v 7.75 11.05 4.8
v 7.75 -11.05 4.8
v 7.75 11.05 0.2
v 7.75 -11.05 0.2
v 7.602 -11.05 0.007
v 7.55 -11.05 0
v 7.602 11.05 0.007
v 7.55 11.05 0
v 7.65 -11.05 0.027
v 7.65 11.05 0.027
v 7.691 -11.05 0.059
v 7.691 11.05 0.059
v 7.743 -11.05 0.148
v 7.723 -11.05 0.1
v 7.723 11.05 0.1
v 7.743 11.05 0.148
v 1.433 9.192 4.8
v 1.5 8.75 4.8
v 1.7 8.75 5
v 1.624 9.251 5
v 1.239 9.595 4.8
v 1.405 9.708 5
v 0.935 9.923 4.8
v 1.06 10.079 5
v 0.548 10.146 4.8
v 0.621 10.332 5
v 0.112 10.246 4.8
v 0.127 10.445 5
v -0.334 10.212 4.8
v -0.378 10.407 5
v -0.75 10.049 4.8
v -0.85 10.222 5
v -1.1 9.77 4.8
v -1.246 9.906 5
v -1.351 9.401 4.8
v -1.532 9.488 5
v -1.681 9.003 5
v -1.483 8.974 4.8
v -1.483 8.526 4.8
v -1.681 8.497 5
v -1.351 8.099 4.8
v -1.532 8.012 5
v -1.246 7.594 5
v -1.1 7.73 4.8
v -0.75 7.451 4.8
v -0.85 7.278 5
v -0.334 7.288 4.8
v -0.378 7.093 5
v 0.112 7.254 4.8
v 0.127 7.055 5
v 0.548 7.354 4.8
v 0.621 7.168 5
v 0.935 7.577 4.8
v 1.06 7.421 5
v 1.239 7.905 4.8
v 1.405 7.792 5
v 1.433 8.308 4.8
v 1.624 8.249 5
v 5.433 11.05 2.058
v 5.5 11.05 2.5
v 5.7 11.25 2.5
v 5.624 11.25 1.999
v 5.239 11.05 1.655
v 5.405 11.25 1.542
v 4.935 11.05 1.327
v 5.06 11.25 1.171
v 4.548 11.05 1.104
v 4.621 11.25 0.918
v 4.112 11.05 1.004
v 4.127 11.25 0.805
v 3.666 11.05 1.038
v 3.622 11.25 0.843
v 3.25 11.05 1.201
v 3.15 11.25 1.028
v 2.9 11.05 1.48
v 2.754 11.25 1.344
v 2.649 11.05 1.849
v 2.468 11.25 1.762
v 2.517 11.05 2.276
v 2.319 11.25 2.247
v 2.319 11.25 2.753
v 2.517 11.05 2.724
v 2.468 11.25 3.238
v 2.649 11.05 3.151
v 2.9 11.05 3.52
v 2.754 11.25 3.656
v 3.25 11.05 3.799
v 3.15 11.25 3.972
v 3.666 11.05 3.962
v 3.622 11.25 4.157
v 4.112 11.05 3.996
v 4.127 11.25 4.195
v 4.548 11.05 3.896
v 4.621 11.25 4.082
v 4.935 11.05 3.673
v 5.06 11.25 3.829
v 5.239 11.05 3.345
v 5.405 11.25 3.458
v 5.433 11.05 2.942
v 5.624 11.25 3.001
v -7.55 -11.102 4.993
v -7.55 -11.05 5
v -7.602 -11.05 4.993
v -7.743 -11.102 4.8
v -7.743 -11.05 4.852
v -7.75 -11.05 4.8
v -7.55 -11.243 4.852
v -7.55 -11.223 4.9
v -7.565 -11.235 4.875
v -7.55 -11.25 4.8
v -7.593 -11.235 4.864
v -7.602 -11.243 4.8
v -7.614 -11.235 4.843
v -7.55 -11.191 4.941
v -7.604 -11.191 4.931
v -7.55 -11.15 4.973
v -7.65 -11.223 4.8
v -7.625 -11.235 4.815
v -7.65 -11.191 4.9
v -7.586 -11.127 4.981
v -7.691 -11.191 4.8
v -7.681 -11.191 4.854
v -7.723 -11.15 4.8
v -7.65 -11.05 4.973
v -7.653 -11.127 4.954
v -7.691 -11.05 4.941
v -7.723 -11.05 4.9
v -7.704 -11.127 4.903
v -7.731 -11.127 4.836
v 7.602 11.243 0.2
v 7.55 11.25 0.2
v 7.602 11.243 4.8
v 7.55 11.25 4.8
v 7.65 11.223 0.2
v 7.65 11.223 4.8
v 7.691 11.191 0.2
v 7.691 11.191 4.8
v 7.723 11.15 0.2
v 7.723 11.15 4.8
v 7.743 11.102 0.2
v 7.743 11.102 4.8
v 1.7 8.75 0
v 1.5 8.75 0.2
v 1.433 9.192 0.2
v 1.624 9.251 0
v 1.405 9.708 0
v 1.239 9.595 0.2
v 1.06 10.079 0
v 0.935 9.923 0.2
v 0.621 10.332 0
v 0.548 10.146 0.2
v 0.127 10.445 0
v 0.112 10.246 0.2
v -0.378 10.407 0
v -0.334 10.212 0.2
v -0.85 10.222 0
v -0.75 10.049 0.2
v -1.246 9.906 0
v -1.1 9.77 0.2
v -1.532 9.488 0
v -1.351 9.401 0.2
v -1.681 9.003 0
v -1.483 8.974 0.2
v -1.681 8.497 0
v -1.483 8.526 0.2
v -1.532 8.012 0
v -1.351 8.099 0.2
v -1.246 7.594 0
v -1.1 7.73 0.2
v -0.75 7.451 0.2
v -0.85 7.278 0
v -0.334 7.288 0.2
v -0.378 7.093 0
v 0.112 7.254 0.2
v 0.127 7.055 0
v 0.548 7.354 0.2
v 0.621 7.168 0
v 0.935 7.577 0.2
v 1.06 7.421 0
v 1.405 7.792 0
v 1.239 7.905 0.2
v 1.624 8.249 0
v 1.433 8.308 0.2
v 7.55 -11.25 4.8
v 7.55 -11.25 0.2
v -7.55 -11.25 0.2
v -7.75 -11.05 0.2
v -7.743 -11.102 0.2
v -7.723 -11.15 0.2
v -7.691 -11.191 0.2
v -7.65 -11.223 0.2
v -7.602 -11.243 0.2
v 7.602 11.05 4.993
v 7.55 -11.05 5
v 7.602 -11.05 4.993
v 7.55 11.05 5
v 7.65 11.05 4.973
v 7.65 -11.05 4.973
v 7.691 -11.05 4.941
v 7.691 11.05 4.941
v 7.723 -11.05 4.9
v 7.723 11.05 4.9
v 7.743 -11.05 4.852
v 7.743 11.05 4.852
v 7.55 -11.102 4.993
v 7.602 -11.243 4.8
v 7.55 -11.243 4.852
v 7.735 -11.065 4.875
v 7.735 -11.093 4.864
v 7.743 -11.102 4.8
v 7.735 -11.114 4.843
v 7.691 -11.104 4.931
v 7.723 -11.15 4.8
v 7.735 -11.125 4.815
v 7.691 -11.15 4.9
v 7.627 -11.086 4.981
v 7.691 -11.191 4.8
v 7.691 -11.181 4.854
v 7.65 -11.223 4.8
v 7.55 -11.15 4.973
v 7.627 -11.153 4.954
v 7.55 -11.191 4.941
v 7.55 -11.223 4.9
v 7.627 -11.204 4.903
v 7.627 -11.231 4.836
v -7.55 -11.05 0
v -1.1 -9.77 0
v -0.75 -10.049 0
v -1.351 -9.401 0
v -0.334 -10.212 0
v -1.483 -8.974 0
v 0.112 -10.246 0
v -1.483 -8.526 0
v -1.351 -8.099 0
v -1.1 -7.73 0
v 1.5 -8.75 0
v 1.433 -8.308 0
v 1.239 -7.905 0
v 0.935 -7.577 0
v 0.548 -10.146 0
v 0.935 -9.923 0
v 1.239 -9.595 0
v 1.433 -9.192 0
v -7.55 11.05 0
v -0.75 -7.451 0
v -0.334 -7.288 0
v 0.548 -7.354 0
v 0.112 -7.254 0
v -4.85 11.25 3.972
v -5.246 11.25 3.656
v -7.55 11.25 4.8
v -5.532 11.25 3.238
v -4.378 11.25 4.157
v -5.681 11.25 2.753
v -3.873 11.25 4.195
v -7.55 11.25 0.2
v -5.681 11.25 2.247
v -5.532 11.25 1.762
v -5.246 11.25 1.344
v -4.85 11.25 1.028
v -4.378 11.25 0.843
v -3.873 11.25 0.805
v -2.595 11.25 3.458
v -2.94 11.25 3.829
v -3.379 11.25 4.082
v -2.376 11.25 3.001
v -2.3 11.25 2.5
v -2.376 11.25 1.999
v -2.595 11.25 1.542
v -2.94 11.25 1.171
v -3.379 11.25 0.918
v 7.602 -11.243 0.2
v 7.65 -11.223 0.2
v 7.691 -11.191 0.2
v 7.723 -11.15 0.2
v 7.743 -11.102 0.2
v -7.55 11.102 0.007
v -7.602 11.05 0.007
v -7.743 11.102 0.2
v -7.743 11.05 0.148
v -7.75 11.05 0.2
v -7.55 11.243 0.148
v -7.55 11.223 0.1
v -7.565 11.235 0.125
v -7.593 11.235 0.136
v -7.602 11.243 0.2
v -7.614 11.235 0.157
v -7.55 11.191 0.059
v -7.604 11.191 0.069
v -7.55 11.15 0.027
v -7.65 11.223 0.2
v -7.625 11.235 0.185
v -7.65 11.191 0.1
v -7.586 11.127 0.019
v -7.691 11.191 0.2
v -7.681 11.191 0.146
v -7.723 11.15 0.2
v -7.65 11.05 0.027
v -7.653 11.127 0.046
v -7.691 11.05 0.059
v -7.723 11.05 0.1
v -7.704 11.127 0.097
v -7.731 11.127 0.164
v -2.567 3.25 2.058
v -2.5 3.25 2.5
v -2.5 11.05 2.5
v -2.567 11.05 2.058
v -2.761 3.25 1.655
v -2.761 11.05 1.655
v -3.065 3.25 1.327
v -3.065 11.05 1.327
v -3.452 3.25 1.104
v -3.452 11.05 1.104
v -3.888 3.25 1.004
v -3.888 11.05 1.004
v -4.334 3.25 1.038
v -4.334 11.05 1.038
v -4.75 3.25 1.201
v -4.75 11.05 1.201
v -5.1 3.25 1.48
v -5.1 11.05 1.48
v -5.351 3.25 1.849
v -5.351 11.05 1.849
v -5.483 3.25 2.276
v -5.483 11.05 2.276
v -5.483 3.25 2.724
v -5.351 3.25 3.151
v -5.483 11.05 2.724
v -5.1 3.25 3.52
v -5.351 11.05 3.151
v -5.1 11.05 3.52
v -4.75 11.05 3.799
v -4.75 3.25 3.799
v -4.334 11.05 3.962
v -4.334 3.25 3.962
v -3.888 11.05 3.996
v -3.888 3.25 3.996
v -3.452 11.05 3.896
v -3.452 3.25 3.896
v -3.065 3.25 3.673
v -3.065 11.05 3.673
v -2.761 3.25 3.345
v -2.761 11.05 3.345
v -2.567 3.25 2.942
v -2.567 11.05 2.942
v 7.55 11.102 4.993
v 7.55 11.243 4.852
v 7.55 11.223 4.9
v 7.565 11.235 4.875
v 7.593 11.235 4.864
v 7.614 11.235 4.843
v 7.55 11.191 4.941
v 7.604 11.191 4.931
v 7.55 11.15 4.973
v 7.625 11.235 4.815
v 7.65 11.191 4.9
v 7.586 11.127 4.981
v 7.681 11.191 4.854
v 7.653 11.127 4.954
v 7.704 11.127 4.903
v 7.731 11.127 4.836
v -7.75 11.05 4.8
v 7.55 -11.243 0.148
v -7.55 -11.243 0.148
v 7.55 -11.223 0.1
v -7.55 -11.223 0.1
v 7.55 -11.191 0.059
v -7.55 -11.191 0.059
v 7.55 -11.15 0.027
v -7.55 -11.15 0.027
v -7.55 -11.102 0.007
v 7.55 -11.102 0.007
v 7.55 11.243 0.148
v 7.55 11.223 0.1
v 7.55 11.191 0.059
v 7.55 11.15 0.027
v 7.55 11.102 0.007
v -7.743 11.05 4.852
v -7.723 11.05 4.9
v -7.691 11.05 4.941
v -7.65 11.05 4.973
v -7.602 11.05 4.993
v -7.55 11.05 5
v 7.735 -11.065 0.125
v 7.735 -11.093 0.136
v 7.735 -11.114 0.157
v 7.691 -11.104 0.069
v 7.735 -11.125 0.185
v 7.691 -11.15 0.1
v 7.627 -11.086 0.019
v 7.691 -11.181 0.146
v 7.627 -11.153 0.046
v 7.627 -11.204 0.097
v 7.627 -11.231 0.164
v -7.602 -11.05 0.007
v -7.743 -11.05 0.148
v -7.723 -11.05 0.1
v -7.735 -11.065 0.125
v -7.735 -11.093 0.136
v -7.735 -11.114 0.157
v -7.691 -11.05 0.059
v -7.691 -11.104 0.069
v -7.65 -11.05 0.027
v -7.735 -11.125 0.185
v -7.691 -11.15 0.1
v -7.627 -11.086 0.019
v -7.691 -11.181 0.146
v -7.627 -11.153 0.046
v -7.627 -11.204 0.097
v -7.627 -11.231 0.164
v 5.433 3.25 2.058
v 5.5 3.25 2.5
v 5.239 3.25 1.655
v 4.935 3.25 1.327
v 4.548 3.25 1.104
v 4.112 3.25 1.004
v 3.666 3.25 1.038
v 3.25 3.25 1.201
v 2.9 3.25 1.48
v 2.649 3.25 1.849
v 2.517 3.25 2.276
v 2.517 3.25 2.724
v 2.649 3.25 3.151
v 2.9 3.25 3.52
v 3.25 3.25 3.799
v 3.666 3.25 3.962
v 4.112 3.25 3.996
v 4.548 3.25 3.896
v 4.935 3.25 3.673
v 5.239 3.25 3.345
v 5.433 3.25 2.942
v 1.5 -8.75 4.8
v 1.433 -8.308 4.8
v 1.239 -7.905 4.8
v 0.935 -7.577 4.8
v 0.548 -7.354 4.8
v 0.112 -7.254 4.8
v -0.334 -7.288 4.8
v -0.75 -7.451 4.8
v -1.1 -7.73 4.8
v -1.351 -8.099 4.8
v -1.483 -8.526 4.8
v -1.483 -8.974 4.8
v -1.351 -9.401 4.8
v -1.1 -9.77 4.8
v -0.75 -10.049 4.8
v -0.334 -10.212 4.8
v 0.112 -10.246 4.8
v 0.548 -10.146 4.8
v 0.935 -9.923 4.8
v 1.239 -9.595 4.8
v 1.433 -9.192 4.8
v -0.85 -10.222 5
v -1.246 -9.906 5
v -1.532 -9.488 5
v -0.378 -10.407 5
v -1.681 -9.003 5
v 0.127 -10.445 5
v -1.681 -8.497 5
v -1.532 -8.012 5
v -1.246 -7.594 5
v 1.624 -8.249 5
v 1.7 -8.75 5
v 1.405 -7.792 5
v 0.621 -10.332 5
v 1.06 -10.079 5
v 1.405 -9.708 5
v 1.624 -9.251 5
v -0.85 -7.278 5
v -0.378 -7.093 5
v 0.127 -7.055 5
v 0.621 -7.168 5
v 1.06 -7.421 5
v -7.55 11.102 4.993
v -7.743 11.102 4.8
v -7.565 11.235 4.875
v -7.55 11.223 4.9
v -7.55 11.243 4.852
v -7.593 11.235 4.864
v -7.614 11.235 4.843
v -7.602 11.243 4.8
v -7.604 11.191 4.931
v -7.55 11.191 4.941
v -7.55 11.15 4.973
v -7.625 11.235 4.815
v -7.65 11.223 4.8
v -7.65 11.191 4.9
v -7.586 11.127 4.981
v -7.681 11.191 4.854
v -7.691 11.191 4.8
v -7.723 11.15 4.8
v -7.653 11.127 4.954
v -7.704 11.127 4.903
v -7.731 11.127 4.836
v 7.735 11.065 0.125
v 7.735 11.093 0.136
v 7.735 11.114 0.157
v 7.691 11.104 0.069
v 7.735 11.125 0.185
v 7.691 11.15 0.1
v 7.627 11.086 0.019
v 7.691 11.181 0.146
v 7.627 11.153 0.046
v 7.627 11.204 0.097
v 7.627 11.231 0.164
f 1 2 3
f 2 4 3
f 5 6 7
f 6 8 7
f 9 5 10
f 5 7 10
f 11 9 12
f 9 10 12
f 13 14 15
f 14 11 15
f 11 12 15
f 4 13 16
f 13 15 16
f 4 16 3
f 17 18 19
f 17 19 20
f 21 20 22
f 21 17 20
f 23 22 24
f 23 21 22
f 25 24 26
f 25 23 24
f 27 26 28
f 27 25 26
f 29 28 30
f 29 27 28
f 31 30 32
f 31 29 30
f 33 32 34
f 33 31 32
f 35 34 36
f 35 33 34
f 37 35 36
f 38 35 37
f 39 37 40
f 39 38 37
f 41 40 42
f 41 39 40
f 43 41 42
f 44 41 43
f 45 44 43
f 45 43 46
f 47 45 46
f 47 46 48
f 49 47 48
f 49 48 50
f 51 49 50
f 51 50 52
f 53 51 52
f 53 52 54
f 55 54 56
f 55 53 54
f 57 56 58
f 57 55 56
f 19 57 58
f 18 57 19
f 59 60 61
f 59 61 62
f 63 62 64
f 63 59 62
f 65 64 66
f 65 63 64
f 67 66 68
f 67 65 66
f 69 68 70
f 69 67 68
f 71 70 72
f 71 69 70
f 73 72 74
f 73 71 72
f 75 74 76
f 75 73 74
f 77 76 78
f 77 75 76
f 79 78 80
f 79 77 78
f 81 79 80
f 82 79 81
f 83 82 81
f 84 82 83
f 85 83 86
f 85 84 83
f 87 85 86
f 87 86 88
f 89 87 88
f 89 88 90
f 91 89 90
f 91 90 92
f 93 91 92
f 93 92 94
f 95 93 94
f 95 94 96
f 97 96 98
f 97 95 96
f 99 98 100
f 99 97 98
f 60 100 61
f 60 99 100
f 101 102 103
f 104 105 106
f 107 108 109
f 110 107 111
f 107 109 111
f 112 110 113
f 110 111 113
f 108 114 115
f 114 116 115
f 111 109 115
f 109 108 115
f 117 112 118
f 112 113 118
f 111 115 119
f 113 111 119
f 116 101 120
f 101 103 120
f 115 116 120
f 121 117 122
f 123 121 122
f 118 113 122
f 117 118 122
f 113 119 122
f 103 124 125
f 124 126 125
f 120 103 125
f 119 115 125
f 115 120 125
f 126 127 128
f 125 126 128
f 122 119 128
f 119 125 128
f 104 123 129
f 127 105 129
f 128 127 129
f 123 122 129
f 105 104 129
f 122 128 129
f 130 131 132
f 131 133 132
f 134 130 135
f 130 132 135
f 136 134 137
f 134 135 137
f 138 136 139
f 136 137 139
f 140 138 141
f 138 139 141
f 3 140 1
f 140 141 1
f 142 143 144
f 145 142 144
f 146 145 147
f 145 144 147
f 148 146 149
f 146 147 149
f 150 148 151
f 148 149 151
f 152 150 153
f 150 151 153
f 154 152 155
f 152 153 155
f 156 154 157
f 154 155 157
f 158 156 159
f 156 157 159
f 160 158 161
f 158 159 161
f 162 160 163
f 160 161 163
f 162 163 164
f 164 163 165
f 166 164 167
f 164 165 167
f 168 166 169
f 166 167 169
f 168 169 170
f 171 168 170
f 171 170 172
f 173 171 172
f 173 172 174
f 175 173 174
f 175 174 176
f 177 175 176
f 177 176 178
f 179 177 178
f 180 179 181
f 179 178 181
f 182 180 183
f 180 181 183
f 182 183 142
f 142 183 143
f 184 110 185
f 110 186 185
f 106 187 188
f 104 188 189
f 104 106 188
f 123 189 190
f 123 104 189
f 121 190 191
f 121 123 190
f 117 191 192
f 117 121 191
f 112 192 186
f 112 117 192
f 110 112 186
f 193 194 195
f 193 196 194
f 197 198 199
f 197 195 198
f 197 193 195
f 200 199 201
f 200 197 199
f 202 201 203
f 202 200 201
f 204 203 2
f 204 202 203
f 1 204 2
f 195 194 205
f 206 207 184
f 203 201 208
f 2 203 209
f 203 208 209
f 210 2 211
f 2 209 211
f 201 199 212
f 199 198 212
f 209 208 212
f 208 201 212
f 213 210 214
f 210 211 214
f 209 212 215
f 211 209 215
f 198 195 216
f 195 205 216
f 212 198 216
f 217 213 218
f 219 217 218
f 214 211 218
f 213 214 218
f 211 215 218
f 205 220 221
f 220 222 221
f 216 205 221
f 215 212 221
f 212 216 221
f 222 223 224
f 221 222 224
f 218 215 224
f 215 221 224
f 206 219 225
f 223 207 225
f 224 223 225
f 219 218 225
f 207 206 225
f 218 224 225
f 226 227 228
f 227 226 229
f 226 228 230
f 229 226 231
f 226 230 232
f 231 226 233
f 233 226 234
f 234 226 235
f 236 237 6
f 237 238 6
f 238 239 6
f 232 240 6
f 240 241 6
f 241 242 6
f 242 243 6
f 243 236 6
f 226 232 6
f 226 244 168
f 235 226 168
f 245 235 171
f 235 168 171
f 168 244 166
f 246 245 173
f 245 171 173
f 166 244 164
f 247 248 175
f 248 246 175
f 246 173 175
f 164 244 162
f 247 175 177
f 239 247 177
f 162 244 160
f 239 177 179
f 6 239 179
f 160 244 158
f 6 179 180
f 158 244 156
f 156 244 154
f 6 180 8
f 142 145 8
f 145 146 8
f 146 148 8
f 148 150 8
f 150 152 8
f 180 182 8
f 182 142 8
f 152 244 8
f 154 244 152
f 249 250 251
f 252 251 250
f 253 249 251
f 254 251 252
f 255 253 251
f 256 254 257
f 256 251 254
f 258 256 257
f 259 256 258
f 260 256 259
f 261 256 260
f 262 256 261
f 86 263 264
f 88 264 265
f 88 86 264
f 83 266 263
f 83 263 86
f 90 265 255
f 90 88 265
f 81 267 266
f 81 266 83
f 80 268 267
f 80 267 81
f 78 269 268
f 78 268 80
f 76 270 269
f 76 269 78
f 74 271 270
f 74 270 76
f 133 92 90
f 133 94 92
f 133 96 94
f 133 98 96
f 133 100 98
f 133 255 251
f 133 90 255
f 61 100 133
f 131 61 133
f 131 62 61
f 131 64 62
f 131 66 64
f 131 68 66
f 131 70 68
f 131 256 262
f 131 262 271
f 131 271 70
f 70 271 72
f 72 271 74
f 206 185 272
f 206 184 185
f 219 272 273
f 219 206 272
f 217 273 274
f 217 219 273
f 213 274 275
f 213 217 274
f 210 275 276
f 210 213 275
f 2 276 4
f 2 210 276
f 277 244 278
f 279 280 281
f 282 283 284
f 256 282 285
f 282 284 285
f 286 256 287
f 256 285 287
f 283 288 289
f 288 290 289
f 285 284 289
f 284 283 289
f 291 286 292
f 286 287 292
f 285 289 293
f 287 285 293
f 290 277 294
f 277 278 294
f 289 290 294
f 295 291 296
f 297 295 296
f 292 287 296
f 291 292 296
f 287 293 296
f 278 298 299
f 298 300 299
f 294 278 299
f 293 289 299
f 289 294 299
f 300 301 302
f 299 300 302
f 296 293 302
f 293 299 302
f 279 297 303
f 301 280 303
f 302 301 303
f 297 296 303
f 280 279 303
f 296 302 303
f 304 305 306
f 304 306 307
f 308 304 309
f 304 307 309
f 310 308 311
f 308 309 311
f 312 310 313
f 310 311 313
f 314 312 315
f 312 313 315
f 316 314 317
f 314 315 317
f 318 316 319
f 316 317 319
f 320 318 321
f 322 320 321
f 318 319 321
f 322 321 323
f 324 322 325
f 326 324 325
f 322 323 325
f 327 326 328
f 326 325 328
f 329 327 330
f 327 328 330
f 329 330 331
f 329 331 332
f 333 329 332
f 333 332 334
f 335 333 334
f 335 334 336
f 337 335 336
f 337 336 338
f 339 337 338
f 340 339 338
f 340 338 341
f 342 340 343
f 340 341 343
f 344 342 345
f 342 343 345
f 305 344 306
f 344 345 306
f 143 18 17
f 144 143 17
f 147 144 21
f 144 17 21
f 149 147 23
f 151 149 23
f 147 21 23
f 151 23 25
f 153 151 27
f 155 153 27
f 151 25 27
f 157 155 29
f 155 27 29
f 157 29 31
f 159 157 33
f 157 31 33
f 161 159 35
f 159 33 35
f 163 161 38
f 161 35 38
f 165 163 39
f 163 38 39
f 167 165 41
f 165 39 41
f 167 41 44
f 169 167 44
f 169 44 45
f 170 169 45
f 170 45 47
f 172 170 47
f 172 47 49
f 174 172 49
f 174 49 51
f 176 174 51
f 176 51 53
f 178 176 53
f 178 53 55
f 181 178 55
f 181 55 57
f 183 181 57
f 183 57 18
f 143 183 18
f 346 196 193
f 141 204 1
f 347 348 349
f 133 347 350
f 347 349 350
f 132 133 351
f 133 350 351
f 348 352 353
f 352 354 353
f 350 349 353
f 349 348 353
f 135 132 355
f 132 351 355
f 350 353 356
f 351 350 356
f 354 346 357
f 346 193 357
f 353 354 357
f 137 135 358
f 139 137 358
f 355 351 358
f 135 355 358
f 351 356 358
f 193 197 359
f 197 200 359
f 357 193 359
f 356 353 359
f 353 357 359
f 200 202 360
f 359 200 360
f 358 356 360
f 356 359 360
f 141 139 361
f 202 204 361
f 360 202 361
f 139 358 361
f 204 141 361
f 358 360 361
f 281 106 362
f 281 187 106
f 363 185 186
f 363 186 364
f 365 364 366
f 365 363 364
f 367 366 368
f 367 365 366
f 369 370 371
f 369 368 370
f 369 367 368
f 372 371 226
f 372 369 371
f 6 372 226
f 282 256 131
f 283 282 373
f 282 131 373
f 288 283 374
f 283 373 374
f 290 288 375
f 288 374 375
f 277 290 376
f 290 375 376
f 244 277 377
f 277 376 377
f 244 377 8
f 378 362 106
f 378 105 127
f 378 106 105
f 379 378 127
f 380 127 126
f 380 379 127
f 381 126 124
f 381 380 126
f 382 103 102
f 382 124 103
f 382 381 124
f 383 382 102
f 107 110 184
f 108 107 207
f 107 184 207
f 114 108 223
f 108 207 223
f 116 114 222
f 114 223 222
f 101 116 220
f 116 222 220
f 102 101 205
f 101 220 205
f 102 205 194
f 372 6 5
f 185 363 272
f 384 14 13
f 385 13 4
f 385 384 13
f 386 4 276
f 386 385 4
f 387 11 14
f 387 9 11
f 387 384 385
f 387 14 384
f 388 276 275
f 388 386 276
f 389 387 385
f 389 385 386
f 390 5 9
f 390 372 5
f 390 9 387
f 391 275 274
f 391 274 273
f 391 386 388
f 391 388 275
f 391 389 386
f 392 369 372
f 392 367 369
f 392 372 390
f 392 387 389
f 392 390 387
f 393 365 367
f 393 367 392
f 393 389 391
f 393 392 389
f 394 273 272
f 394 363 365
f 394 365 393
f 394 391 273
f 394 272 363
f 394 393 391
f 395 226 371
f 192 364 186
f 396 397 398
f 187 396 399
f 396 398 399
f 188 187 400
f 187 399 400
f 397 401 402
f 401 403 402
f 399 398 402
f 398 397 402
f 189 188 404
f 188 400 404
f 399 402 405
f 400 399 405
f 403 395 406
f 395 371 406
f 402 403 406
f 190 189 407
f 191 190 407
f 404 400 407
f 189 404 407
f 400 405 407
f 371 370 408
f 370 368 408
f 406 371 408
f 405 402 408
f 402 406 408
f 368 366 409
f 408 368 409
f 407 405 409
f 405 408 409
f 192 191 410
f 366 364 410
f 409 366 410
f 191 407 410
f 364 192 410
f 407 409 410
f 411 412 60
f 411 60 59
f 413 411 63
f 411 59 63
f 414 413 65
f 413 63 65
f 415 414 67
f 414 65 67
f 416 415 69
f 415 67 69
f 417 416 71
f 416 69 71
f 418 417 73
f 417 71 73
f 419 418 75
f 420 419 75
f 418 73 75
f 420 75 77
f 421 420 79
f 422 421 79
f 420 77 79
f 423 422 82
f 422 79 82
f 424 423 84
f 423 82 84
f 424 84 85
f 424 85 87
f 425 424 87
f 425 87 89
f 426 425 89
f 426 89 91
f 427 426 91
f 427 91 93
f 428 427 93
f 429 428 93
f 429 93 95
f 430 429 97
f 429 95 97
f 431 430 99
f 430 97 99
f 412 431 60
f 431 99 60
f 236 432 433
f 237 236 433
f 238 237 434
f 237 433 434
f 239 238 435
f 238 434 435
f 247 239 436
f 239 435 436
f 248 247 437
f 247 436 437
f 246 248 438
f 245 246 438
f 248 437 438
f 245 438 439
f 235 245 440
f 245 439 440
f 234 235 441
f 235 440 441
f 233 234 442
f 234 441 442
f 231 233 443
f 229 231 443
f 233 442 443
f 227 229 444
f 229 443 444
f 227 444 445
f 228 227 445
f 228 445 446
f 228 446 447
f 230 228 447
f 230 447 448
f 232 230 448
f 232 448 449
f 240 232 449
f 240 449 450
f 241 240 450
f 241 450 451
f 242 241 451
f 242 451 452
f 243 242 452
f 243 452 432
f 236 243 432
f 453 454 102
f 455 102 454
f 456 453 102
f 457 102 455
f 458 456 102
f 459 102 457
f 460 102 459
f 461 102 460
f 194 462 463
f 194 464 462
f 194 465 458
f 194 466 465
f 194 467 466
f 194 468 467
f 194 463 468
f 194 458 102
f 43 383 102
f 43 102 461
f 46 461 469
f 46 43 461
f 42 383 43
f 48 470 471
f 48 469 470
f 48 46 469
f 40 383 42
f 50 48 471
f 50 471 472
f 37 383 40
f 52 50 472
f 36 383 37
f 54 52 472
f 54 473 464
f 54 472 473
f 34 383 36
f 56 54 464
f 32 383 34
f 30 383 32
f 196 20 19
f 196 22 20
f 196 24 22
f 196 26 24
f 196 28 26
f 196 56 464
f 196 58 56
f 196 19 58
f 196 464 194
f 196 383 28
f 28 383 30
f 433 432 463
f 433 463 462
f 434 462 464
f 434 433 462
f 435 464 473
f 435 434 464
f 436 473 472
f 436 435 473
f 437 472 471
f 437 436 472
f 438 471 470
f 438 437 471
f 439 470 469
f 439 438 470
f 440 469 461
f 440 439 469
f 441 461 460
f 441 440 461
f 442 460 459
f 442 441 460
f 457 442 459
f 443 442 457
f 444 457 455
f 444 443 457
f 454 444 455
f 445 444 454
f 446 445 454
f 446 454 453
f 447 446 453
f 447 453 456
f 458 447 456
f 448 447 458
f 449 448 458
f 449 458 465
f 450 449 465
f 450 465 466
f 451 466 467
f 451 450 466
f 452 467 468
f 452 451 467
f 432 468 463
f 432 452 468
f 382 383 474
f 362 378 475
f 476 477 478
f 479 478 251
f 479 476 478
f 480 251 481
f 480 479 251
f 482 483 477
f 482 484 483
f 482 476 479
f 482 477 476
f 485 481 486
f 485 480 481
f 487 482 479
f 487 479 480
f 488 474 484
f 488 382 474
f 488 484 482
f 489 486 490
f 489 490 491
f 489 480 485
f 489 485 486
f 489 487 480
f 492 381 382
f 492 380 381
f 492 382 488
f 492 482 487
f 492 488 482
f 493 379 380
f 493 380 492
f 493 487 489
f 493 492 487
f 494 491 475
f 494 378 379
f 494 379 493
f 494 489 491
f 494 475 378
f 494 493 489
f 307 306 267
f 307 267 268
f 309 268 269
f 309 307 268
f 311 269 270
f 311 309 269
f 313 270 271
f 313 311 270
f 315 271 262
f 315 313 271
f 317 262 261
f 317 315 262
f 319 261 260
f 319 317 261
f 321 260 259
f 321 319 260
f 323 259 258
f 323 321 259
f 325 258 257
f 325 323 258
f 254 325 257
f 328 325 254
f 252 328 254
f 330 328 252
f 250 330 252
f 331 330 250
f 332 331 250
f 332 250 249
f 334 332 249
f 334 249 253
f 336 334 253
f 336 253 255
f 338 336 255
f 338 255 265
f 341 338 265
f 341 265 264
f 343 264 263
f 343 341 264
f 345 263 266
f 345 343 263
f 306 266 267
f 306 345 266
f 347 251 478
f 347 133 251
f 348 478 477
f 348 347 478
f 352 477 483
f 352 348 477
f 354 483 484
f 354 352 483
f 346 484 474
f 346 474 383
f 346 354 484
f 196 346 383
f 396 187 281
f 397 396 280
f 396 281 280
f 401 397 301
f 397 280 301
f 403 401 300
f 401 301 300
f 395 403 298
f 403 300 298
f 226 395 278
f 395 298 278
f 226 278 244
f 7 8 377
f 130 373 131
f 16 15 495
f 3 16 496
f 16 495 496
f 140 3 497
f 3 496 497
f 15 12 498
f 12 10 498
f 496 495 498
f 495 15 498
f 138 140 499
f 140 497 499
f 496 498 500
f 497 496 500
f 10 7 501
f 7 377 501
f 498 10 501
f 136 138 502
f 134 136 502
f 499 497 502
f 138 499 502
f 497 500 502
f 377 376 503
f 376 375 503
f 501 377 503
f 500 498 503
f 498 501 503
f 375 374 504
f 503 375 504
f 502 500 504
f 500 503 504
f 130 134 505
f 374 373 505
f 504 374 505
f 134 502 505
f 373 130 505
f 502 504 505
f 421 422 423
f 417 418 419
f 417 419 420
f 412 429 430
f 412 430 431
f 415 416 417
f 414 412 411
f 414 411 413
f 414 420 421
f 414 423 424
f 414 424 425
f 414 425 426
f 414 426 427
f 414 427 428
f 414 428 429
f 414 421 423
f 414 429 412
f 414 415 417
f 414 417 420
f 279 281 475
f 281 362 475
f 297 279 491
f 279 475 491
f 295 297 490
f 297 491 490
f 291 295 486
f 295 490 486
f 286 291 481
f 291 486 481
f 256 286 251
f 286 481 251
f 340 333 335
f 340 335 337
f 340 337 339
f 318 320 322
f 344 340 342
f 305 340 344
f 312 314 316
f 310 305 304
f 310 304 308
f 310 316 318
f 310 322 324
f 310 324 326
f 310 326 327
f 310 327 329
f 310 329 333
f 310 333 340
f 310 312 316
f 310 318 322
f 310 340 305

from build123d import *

# Parameters (mm, degrees)
SKETCH1_W           = 15.5
SKETCH1_H           = 22.5
BOSS_EXTRUDE1_DEPTH = 5
SKETCH2_R           = 1.5
CUT_EXTRUDE1_DEPTH  = 6
SKETCH3_R           = 1.5
CUT_EXTRUDE2_DEPTH  = 8
FILLET1_R           = 0.2
CHAMFER1_SIZE       = 0.2


with BuildPart() as part:
    # Sketch1 → Boss-Extrude1 (new body)
    with BuildSketch(Plane.XY):
        Rectangle(SKETCH1_W, SKETCH1_H)
    extrude(amount=BOSS_EXTRUDE1_DEPTH)

    # Sketch2 → Cut-Extrude1 (cut, through all)
    with BuildSketch(Plane.XY.offset(5)):
        with Locations((0, 8.75)):
            Circle(SKETCH2_R)
        with Locations((0, -8.75)):
            Circle(SKETCH2_R)
    extrude(amount=-CUT_EXTRUDE1_DEPTH, mode=Mode.SUBTRACT)

    # Sketch3 → Cut-Extrude2 (cut)
    with BuildSketch(Plane(origin=(0, 11.25, 0), x_dir=(1, 0, 0), z_dir=(0, 1, 0))):
        with Locations((-4, -2.5)):
            Circle(SKETCH3_R)
        with Locations((4, -2.5)):
            Circle(SKETCH3_R)
    extrude(amount=-CUT_EXTRUDE2_DEPTH, mode=Mode.SUBTRACT)

    # Fillet1
    fillet1_edges = [part.edges().sort_by_distance(p)[0] for p in [
        (-7.75, 0, 5),
        (0, -11.25, 5),
        (7.75, 0, 5),
        (0, -11.25, 0),
        (-7.75, 0, 0),
        (0, 11.25, 0),
        (7.75, 0, 0),
        (0, 11.25, 5),
        (7.75, -11.25, 2.5),
        (-7.75, -11.25, 2.5),
        (-7.75, 11.25, 2.5),
        (7.75, 11.25, 2.5),
    ]]
    fillet(fillet1_edges, radius=FILLET1_R)

    # Chamfer1
    chamfer1_edges = [part.edges().sort_by_distance(p)[0] for p in [
        (-1.5, 8.75, 0),
        (-1.5, 8.75, 5),
        (-1.5, -8.75, 5),
        (-5.5, 11.25, 2.5),
        (2.5, 11.25, 2.5),
    ]]
    chamfer(chamfer1_edges, length=CHAMFER1_SIZE)


solid = part.part
